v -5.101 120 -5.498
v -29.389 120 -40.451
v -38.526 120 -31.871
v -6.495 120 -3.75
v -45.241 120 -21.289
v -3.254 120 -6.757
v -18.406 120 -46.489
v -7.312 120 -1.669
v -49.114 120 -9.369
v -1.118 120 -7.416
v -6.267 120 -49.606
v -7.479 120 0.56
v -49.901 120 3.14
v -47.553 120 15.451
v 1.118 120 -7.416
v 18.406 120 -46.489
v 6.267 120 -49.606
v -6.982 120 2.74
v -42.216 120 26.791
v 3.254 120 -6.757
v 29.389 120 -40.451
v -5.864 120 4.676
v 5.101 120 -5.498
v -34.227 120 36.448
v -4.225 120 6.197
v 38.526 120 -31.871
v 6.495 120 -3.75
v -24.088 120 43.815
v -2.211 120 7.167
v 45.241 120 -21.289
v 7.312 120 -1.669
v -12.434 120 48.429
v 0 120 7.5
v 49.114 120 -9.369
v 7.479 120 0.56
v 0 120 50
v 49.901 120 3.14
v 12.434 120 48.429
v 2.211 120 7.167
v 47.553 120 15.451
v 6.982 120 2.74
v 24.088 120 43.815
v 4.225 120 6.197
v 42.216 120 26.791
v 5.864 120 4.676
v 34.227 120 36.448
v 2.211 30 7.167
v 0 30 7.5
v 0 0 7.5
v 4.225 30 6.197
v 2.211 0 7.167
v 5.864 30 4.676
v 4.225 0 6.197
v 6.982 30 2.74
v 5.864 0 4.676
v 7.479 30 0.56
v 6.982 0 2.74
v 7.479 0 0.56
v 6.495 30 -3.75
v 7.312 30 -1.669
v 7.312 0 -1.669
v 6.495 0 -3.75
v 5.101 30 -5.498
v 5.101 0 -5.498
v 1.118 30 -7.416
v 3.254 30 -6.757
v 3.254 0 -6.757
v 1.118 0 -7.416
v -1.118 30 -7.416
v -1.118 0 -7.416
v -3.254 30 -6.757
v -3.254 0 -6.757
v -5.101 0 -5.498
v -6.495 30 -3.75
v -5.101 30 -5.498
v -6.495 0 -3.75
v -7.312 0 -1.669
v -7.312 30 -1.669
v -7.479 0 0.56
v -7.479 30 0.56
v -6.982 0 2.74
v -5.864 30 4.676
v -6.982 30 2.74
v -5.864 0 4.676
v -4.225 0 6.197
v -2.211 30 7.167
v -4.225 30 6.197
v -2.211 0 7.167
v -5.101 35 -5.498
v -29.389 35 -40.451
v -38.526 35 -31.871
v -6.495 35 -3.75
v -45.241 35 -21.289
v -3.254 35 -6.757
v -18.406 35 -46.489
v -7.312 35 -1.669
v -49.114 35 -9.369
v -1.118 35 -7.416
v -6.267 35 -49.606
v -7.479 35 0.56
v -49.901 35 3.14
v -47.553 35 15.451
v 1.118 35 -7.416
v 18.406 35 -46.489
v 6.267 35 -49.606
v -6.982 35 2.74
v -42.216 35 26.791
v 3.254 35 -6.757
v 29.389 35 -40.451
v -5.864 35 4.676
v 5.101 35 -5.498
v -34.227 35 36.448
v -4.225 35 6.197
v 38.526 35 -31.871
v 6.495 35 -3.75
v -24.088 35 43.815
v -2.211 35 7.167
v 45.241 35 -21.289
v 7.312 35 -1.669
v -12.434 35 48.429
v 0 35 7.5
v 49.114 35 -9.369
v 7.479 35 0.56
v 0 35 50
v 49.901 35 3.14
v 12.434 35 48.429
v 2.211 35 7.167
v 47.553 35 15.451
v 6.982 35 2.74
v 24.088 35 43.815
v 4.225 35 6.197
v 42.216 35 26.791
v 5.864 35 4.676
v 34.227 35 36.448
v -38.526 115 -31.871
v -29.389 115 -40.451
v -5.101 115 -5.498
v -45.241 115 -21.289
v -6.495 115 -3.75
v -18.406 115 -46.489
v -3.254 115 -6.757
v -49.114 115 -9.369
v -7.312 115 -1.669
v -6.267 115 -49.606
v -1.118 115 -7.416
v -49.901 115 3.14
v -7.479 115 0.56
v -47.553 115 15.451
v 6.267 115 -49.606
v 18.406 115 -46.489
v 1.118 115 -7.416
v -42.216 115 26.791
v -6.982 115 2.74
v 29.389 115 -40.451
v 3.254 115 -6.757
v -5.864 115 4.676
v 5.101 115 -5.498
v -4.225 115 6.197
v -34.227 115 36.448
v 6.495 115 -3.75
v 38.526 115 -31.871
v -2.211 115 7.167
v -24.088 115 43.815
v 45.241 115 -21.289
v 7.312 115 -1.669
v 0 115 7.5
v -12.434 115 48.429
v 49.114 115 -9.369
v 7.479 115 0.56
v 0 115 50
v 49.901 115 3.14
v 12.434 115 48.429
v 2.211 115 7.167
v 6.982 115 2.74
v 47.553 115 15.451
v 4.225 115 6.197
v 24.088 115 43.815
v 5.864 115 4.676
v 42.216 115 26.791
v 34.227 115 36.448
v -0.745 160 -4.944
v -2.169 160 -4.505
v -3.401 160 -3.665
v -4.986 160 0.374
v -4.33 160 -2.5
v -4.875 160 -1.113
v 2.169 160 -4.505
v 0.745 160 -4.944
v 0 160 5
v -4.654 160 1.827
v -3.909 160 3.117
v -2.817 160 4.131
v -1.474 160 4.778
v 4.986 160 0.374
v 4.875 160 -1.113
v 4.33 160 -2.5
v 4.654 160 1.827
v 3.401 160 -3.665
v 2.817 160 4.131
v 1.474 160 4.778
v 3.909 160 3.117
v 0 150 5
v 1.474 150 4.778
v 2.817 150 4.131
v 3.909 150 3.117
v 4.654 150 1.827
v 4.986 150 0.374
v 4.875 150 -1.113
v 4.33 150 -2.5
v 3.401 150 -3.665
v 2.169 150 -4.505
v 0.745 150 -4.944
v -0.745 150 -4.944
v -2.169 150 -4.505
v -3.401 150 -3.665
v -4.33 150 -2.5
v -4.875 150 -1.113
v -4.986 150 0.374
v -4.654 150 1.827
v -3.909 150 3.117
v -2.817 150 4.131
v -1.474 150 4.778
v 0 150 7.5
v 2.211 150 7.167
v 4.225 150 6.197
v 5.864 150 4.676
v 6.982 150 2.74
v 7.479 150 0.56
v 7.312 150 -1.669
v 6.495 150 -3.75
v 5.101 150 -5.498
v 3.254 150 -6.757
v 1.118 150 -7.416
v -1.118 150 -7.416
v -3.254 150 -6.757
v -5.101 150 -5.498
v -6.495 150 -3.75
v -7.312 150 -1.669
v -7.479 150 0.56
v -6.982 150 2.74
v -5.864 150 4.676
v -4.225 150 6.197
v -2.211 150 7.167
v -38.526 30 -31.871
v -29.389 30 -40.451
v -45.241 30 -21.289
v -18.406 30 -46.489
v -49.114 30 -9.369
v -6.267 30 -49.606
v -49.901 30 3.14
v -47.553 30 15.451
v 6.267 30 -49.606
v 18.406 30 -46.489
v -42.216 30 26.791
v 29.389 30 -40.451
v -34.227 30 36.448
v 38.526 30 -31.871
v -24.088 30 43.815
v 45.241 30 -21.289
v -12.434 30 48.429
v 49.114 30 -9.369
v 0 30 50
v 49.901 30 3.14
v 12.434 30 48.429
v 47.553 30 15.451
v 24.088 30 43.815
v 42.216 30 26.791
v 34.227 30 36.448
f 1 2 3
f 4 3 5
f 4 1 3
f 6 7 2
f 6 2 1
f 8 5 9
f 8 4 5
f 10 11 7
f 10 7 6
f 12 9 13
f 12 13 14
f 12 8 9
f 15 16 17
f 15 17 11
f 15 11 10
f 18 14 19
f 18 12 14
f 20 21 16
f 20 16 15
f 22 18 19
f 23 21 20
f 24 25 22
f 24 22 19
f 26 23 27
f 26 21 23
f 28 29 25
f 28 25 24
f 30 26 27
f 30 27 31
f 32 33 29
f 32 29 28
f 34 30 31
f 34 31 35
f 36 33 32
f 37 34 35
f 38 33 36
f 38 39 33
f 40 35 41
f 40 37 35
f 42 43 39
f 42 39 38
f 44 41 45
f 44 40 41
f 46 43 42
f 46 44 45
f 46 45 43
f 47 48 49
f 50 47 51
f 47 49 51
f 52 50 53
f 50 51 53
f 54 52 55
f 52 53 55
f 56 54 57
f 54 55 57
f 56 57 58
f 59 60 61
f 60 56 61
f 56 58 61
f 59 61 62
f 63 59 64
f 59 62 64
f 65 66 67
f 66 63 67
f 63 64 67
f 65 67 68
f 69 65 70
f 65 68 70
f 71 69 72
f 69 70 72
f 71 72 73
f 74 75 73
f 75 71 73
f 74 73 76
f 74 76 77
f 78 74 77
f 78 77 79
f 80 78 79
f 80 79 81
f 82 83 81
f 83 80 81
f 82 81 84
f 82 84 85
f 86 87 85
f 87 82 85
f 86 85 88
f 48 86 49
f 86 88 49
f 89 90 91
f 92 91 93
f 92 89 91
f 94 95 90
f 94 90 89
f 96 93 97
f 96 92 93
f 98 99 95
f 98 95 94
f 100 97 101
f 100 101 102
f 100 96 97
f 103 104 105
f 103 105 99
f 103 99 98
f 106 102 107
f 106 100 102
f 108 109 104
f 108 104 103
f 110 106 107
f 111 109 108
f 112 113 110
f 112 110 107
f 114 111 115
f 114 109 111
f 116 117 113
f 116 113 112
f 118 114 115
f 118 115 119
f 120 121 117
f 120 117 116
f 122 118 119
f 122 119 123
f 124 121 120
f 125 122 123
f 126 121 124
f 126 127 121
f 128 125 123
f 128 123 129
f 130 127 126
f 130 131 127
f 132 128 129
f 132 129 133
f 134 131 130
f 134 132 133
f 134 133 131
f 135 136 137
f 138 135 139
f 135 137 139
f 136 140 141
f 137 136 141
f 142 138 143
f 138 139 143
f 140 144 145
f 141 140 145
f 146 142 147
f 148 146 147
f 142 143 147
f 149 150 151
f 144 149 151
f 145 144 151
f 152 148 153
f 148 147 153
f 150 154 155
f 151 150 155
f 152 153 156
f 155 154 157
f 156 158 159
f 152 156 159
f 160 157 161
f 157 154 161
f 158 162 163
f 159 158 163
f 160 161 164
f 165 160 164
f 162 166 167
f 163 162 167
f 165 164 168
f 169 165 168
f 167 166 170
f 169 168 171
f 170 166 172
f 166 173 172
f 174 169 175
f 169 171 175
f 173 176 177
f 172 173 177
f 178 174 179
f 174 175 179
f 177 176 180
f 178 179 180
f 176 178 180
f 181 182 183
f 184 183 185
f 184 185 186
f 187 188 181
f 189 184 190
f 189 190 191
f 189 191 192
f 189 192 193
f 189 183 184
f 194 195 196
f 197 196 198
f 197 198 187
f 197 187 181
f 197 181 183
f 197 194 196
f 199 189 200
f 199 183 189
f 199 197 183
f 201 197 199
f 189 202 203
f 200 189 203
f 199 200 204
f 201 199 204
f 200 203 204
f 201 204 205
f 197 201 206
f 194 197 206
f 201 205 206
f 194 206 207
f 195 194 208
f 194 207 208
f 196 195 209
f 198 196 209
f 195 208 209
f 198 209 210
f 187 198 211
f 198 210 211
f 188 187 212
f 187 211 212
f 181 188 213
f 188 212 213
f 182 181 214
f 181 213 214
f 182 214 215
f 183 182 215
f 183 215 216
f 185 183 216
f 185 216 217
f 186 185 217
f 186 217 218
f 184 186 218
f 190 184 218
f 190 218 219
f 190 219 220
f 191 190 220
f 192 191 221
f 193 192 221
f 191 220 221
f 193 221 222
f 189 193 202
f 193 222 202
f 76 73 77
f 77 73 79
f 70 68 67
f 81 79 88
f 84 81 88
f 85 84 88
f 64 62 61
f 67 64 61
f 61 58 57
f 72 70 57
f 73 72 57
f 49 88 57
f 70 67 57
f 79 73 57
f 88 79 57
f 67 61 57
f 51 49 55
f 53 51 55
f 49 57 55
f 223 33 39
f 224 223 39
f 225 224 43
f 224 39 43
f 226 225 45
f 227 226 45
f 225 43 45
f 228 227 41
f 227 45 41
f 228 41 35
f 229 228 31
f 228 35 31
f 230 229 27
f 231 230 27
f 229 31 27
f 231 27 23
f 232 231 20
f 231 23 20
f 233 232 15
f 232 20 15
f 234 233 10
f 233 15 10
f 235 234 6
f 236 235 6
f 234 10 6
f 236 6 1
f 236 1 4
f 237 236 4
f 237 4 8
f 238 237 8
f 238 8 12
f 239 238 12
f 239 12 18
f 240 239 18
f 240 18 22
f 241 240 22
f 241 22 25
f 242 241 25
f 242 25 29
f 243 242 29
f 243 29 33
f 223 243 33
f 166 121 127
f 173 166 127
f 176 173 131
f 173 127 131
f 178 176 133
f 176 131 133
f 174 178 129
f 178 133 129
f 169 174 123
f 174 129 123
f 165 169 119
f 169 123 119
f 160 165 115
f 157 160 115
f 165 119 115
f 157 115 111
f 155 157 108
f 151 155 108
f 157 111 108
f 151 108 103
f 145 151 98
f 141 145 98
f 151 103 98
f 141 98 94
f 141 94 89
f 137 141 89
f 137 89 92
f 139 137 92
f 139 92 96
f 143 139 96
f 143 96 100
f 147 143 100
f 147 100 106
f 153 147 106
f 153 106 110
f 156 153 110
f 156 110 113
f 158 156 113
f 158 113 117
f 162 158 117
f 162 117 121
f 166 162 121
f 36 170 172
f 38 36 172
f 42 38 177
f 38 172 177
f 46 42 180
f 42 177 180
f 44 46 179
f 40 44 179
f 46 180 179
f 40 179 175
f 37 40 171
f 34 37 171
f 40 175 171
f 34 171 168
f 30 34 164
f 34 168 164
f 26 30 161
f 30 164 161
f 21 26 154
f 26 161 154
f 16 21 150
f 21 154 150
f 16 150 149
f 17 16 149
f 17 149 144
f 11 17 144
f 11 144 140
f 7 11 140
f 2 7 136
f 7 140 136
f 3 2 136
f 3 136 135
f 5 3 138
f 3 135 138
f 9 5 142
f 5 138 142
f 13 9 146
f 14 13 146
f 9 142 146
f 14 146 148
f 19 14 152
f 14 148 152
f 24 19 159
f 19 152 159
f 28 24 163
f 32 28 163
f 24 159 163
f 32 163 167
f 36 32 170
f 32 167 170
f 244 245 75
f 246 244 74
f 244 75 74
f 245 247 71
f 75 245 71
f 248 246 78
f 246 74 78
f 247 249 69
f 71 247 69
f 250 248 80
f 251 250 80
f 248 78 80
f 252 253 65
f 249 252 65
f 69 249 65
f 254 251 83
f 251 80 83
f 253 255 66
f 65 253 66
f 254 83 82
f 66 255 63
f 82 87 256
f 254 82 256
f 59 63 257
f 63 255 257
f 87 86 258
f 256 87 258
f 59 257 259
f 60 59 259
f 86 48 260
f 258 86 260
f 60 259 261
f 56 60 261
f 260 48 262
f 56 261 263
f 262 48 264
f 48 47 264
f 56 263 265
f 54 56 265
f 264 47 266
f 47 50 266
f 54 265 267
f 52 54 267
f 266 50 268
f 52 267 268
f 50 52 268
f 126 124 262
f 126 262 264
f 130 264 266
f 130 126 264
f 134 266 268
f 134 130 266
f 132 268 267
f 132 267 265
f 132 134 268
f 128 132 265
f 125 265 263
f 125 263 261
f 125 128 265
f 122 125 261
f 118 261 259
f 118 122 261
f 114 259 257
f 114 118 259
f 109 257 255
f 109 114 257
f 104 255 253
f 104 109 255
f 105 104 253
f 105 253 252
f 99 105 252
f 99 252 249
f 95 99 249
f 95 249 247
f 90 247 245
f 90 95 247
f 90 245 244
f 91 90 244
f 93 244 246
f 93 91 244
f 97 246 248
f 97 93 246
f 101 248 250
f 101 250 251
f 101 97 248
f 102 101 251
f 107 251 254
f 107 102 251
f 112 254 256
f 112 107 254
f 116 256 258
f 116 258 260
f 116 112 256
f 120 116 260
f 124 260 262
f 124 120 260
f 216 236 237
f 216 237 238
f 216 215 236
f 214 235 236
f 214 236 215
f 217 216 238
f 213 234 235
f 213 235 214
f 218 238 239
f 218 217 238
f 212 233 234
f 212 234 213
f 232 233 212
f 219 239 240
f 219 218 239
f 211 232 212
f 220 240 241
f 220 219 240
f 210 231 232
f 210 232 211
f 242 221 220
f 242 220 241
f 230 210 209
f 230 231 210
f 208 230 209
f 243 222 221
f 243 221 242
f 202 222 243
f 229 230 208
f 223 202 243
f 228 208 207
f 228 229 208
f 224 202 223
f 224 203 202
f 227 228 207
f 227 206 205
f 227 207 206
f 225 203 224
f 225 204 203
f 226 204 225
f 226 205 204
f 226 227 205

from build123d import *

# Parameters (mm, degrees)
SKETCH1_R           = 7.5
BOSS_EXTRUDE1_DEPTH = 160
BOSS_EXTRUDE2_START = 35
SKETCH1_3_R         = 50
BOSS_EXTRUDE2_DEPTH = 5
BOSS_EXTRUDE3_START = 115
SKETCH1_4_R         = 50
SKETCH1_4_R_2       = 7.5
BOSS_EXTRUDE3_DEPTH = 5
CUT_EXTRUDE1_START  = -10
SKETCH2_R           = 7.5
SKETCH2_R_2         = 5
CUT_EXTRUDE1_DEPTH  = 10


with BuildPart() as part:
    # Sketch1 → Boss-Extrude1 (new body)
    with BuildSketch(Plane(origin=(0, 0, 0), x_dir=(1, 0, 0), z_dir=(0, 1, 0))):
        Circle(SKETCH1_R)
    extrude(amount=BOSS_EXTRUDE1_DEPTH)

    # Sketch1<3> → Boss-Extrude2 (add)
    with BuildSketch(Plane(origin=(0, 0, 0), x_dir=(1, 0, 0), z_dir=(0, 1, 0)).offset(BOSS_EXTRUDE2_START)):
        Circle(SKETCH1_3_R)
    extrude(amount=-BOSS_EXTRUDE2_DEPTH)

    # Sketch1<4> → Boss-Extrude3 (add)
    with BuildSketch(Plane(origin=(0, 0, 0), x_dir=(1, 0, 0), z_dir=(0, 1, 0)).offset(BOSS_EXTRUDE3_START)):
        Circle(SKETCH1_4_R)
        Circle(SKETCH1_4_R_2, mode=Mode.SUBTRACT)
    extrude(amount=BOSS_EXTRUDE3_DEPTH)

    # Sketch2 → Cut-Extrude1 (cut)
    with BuildSketch(Plane(origin=(0, 160, 0), x_dir=(1, 0, 0), z_dir=(0, 1, 0)).offset(CUT_EXTRUDE1_START)):
        Circle(SKETCH2_R)
        Circle(SKETCH2_R_2, mode=Mode.SUBTRACT)
    extrude(amount=CUT_EXTRUDE1_DEPTH, mode=Mode.SUBTRACT)


solid = part.part
